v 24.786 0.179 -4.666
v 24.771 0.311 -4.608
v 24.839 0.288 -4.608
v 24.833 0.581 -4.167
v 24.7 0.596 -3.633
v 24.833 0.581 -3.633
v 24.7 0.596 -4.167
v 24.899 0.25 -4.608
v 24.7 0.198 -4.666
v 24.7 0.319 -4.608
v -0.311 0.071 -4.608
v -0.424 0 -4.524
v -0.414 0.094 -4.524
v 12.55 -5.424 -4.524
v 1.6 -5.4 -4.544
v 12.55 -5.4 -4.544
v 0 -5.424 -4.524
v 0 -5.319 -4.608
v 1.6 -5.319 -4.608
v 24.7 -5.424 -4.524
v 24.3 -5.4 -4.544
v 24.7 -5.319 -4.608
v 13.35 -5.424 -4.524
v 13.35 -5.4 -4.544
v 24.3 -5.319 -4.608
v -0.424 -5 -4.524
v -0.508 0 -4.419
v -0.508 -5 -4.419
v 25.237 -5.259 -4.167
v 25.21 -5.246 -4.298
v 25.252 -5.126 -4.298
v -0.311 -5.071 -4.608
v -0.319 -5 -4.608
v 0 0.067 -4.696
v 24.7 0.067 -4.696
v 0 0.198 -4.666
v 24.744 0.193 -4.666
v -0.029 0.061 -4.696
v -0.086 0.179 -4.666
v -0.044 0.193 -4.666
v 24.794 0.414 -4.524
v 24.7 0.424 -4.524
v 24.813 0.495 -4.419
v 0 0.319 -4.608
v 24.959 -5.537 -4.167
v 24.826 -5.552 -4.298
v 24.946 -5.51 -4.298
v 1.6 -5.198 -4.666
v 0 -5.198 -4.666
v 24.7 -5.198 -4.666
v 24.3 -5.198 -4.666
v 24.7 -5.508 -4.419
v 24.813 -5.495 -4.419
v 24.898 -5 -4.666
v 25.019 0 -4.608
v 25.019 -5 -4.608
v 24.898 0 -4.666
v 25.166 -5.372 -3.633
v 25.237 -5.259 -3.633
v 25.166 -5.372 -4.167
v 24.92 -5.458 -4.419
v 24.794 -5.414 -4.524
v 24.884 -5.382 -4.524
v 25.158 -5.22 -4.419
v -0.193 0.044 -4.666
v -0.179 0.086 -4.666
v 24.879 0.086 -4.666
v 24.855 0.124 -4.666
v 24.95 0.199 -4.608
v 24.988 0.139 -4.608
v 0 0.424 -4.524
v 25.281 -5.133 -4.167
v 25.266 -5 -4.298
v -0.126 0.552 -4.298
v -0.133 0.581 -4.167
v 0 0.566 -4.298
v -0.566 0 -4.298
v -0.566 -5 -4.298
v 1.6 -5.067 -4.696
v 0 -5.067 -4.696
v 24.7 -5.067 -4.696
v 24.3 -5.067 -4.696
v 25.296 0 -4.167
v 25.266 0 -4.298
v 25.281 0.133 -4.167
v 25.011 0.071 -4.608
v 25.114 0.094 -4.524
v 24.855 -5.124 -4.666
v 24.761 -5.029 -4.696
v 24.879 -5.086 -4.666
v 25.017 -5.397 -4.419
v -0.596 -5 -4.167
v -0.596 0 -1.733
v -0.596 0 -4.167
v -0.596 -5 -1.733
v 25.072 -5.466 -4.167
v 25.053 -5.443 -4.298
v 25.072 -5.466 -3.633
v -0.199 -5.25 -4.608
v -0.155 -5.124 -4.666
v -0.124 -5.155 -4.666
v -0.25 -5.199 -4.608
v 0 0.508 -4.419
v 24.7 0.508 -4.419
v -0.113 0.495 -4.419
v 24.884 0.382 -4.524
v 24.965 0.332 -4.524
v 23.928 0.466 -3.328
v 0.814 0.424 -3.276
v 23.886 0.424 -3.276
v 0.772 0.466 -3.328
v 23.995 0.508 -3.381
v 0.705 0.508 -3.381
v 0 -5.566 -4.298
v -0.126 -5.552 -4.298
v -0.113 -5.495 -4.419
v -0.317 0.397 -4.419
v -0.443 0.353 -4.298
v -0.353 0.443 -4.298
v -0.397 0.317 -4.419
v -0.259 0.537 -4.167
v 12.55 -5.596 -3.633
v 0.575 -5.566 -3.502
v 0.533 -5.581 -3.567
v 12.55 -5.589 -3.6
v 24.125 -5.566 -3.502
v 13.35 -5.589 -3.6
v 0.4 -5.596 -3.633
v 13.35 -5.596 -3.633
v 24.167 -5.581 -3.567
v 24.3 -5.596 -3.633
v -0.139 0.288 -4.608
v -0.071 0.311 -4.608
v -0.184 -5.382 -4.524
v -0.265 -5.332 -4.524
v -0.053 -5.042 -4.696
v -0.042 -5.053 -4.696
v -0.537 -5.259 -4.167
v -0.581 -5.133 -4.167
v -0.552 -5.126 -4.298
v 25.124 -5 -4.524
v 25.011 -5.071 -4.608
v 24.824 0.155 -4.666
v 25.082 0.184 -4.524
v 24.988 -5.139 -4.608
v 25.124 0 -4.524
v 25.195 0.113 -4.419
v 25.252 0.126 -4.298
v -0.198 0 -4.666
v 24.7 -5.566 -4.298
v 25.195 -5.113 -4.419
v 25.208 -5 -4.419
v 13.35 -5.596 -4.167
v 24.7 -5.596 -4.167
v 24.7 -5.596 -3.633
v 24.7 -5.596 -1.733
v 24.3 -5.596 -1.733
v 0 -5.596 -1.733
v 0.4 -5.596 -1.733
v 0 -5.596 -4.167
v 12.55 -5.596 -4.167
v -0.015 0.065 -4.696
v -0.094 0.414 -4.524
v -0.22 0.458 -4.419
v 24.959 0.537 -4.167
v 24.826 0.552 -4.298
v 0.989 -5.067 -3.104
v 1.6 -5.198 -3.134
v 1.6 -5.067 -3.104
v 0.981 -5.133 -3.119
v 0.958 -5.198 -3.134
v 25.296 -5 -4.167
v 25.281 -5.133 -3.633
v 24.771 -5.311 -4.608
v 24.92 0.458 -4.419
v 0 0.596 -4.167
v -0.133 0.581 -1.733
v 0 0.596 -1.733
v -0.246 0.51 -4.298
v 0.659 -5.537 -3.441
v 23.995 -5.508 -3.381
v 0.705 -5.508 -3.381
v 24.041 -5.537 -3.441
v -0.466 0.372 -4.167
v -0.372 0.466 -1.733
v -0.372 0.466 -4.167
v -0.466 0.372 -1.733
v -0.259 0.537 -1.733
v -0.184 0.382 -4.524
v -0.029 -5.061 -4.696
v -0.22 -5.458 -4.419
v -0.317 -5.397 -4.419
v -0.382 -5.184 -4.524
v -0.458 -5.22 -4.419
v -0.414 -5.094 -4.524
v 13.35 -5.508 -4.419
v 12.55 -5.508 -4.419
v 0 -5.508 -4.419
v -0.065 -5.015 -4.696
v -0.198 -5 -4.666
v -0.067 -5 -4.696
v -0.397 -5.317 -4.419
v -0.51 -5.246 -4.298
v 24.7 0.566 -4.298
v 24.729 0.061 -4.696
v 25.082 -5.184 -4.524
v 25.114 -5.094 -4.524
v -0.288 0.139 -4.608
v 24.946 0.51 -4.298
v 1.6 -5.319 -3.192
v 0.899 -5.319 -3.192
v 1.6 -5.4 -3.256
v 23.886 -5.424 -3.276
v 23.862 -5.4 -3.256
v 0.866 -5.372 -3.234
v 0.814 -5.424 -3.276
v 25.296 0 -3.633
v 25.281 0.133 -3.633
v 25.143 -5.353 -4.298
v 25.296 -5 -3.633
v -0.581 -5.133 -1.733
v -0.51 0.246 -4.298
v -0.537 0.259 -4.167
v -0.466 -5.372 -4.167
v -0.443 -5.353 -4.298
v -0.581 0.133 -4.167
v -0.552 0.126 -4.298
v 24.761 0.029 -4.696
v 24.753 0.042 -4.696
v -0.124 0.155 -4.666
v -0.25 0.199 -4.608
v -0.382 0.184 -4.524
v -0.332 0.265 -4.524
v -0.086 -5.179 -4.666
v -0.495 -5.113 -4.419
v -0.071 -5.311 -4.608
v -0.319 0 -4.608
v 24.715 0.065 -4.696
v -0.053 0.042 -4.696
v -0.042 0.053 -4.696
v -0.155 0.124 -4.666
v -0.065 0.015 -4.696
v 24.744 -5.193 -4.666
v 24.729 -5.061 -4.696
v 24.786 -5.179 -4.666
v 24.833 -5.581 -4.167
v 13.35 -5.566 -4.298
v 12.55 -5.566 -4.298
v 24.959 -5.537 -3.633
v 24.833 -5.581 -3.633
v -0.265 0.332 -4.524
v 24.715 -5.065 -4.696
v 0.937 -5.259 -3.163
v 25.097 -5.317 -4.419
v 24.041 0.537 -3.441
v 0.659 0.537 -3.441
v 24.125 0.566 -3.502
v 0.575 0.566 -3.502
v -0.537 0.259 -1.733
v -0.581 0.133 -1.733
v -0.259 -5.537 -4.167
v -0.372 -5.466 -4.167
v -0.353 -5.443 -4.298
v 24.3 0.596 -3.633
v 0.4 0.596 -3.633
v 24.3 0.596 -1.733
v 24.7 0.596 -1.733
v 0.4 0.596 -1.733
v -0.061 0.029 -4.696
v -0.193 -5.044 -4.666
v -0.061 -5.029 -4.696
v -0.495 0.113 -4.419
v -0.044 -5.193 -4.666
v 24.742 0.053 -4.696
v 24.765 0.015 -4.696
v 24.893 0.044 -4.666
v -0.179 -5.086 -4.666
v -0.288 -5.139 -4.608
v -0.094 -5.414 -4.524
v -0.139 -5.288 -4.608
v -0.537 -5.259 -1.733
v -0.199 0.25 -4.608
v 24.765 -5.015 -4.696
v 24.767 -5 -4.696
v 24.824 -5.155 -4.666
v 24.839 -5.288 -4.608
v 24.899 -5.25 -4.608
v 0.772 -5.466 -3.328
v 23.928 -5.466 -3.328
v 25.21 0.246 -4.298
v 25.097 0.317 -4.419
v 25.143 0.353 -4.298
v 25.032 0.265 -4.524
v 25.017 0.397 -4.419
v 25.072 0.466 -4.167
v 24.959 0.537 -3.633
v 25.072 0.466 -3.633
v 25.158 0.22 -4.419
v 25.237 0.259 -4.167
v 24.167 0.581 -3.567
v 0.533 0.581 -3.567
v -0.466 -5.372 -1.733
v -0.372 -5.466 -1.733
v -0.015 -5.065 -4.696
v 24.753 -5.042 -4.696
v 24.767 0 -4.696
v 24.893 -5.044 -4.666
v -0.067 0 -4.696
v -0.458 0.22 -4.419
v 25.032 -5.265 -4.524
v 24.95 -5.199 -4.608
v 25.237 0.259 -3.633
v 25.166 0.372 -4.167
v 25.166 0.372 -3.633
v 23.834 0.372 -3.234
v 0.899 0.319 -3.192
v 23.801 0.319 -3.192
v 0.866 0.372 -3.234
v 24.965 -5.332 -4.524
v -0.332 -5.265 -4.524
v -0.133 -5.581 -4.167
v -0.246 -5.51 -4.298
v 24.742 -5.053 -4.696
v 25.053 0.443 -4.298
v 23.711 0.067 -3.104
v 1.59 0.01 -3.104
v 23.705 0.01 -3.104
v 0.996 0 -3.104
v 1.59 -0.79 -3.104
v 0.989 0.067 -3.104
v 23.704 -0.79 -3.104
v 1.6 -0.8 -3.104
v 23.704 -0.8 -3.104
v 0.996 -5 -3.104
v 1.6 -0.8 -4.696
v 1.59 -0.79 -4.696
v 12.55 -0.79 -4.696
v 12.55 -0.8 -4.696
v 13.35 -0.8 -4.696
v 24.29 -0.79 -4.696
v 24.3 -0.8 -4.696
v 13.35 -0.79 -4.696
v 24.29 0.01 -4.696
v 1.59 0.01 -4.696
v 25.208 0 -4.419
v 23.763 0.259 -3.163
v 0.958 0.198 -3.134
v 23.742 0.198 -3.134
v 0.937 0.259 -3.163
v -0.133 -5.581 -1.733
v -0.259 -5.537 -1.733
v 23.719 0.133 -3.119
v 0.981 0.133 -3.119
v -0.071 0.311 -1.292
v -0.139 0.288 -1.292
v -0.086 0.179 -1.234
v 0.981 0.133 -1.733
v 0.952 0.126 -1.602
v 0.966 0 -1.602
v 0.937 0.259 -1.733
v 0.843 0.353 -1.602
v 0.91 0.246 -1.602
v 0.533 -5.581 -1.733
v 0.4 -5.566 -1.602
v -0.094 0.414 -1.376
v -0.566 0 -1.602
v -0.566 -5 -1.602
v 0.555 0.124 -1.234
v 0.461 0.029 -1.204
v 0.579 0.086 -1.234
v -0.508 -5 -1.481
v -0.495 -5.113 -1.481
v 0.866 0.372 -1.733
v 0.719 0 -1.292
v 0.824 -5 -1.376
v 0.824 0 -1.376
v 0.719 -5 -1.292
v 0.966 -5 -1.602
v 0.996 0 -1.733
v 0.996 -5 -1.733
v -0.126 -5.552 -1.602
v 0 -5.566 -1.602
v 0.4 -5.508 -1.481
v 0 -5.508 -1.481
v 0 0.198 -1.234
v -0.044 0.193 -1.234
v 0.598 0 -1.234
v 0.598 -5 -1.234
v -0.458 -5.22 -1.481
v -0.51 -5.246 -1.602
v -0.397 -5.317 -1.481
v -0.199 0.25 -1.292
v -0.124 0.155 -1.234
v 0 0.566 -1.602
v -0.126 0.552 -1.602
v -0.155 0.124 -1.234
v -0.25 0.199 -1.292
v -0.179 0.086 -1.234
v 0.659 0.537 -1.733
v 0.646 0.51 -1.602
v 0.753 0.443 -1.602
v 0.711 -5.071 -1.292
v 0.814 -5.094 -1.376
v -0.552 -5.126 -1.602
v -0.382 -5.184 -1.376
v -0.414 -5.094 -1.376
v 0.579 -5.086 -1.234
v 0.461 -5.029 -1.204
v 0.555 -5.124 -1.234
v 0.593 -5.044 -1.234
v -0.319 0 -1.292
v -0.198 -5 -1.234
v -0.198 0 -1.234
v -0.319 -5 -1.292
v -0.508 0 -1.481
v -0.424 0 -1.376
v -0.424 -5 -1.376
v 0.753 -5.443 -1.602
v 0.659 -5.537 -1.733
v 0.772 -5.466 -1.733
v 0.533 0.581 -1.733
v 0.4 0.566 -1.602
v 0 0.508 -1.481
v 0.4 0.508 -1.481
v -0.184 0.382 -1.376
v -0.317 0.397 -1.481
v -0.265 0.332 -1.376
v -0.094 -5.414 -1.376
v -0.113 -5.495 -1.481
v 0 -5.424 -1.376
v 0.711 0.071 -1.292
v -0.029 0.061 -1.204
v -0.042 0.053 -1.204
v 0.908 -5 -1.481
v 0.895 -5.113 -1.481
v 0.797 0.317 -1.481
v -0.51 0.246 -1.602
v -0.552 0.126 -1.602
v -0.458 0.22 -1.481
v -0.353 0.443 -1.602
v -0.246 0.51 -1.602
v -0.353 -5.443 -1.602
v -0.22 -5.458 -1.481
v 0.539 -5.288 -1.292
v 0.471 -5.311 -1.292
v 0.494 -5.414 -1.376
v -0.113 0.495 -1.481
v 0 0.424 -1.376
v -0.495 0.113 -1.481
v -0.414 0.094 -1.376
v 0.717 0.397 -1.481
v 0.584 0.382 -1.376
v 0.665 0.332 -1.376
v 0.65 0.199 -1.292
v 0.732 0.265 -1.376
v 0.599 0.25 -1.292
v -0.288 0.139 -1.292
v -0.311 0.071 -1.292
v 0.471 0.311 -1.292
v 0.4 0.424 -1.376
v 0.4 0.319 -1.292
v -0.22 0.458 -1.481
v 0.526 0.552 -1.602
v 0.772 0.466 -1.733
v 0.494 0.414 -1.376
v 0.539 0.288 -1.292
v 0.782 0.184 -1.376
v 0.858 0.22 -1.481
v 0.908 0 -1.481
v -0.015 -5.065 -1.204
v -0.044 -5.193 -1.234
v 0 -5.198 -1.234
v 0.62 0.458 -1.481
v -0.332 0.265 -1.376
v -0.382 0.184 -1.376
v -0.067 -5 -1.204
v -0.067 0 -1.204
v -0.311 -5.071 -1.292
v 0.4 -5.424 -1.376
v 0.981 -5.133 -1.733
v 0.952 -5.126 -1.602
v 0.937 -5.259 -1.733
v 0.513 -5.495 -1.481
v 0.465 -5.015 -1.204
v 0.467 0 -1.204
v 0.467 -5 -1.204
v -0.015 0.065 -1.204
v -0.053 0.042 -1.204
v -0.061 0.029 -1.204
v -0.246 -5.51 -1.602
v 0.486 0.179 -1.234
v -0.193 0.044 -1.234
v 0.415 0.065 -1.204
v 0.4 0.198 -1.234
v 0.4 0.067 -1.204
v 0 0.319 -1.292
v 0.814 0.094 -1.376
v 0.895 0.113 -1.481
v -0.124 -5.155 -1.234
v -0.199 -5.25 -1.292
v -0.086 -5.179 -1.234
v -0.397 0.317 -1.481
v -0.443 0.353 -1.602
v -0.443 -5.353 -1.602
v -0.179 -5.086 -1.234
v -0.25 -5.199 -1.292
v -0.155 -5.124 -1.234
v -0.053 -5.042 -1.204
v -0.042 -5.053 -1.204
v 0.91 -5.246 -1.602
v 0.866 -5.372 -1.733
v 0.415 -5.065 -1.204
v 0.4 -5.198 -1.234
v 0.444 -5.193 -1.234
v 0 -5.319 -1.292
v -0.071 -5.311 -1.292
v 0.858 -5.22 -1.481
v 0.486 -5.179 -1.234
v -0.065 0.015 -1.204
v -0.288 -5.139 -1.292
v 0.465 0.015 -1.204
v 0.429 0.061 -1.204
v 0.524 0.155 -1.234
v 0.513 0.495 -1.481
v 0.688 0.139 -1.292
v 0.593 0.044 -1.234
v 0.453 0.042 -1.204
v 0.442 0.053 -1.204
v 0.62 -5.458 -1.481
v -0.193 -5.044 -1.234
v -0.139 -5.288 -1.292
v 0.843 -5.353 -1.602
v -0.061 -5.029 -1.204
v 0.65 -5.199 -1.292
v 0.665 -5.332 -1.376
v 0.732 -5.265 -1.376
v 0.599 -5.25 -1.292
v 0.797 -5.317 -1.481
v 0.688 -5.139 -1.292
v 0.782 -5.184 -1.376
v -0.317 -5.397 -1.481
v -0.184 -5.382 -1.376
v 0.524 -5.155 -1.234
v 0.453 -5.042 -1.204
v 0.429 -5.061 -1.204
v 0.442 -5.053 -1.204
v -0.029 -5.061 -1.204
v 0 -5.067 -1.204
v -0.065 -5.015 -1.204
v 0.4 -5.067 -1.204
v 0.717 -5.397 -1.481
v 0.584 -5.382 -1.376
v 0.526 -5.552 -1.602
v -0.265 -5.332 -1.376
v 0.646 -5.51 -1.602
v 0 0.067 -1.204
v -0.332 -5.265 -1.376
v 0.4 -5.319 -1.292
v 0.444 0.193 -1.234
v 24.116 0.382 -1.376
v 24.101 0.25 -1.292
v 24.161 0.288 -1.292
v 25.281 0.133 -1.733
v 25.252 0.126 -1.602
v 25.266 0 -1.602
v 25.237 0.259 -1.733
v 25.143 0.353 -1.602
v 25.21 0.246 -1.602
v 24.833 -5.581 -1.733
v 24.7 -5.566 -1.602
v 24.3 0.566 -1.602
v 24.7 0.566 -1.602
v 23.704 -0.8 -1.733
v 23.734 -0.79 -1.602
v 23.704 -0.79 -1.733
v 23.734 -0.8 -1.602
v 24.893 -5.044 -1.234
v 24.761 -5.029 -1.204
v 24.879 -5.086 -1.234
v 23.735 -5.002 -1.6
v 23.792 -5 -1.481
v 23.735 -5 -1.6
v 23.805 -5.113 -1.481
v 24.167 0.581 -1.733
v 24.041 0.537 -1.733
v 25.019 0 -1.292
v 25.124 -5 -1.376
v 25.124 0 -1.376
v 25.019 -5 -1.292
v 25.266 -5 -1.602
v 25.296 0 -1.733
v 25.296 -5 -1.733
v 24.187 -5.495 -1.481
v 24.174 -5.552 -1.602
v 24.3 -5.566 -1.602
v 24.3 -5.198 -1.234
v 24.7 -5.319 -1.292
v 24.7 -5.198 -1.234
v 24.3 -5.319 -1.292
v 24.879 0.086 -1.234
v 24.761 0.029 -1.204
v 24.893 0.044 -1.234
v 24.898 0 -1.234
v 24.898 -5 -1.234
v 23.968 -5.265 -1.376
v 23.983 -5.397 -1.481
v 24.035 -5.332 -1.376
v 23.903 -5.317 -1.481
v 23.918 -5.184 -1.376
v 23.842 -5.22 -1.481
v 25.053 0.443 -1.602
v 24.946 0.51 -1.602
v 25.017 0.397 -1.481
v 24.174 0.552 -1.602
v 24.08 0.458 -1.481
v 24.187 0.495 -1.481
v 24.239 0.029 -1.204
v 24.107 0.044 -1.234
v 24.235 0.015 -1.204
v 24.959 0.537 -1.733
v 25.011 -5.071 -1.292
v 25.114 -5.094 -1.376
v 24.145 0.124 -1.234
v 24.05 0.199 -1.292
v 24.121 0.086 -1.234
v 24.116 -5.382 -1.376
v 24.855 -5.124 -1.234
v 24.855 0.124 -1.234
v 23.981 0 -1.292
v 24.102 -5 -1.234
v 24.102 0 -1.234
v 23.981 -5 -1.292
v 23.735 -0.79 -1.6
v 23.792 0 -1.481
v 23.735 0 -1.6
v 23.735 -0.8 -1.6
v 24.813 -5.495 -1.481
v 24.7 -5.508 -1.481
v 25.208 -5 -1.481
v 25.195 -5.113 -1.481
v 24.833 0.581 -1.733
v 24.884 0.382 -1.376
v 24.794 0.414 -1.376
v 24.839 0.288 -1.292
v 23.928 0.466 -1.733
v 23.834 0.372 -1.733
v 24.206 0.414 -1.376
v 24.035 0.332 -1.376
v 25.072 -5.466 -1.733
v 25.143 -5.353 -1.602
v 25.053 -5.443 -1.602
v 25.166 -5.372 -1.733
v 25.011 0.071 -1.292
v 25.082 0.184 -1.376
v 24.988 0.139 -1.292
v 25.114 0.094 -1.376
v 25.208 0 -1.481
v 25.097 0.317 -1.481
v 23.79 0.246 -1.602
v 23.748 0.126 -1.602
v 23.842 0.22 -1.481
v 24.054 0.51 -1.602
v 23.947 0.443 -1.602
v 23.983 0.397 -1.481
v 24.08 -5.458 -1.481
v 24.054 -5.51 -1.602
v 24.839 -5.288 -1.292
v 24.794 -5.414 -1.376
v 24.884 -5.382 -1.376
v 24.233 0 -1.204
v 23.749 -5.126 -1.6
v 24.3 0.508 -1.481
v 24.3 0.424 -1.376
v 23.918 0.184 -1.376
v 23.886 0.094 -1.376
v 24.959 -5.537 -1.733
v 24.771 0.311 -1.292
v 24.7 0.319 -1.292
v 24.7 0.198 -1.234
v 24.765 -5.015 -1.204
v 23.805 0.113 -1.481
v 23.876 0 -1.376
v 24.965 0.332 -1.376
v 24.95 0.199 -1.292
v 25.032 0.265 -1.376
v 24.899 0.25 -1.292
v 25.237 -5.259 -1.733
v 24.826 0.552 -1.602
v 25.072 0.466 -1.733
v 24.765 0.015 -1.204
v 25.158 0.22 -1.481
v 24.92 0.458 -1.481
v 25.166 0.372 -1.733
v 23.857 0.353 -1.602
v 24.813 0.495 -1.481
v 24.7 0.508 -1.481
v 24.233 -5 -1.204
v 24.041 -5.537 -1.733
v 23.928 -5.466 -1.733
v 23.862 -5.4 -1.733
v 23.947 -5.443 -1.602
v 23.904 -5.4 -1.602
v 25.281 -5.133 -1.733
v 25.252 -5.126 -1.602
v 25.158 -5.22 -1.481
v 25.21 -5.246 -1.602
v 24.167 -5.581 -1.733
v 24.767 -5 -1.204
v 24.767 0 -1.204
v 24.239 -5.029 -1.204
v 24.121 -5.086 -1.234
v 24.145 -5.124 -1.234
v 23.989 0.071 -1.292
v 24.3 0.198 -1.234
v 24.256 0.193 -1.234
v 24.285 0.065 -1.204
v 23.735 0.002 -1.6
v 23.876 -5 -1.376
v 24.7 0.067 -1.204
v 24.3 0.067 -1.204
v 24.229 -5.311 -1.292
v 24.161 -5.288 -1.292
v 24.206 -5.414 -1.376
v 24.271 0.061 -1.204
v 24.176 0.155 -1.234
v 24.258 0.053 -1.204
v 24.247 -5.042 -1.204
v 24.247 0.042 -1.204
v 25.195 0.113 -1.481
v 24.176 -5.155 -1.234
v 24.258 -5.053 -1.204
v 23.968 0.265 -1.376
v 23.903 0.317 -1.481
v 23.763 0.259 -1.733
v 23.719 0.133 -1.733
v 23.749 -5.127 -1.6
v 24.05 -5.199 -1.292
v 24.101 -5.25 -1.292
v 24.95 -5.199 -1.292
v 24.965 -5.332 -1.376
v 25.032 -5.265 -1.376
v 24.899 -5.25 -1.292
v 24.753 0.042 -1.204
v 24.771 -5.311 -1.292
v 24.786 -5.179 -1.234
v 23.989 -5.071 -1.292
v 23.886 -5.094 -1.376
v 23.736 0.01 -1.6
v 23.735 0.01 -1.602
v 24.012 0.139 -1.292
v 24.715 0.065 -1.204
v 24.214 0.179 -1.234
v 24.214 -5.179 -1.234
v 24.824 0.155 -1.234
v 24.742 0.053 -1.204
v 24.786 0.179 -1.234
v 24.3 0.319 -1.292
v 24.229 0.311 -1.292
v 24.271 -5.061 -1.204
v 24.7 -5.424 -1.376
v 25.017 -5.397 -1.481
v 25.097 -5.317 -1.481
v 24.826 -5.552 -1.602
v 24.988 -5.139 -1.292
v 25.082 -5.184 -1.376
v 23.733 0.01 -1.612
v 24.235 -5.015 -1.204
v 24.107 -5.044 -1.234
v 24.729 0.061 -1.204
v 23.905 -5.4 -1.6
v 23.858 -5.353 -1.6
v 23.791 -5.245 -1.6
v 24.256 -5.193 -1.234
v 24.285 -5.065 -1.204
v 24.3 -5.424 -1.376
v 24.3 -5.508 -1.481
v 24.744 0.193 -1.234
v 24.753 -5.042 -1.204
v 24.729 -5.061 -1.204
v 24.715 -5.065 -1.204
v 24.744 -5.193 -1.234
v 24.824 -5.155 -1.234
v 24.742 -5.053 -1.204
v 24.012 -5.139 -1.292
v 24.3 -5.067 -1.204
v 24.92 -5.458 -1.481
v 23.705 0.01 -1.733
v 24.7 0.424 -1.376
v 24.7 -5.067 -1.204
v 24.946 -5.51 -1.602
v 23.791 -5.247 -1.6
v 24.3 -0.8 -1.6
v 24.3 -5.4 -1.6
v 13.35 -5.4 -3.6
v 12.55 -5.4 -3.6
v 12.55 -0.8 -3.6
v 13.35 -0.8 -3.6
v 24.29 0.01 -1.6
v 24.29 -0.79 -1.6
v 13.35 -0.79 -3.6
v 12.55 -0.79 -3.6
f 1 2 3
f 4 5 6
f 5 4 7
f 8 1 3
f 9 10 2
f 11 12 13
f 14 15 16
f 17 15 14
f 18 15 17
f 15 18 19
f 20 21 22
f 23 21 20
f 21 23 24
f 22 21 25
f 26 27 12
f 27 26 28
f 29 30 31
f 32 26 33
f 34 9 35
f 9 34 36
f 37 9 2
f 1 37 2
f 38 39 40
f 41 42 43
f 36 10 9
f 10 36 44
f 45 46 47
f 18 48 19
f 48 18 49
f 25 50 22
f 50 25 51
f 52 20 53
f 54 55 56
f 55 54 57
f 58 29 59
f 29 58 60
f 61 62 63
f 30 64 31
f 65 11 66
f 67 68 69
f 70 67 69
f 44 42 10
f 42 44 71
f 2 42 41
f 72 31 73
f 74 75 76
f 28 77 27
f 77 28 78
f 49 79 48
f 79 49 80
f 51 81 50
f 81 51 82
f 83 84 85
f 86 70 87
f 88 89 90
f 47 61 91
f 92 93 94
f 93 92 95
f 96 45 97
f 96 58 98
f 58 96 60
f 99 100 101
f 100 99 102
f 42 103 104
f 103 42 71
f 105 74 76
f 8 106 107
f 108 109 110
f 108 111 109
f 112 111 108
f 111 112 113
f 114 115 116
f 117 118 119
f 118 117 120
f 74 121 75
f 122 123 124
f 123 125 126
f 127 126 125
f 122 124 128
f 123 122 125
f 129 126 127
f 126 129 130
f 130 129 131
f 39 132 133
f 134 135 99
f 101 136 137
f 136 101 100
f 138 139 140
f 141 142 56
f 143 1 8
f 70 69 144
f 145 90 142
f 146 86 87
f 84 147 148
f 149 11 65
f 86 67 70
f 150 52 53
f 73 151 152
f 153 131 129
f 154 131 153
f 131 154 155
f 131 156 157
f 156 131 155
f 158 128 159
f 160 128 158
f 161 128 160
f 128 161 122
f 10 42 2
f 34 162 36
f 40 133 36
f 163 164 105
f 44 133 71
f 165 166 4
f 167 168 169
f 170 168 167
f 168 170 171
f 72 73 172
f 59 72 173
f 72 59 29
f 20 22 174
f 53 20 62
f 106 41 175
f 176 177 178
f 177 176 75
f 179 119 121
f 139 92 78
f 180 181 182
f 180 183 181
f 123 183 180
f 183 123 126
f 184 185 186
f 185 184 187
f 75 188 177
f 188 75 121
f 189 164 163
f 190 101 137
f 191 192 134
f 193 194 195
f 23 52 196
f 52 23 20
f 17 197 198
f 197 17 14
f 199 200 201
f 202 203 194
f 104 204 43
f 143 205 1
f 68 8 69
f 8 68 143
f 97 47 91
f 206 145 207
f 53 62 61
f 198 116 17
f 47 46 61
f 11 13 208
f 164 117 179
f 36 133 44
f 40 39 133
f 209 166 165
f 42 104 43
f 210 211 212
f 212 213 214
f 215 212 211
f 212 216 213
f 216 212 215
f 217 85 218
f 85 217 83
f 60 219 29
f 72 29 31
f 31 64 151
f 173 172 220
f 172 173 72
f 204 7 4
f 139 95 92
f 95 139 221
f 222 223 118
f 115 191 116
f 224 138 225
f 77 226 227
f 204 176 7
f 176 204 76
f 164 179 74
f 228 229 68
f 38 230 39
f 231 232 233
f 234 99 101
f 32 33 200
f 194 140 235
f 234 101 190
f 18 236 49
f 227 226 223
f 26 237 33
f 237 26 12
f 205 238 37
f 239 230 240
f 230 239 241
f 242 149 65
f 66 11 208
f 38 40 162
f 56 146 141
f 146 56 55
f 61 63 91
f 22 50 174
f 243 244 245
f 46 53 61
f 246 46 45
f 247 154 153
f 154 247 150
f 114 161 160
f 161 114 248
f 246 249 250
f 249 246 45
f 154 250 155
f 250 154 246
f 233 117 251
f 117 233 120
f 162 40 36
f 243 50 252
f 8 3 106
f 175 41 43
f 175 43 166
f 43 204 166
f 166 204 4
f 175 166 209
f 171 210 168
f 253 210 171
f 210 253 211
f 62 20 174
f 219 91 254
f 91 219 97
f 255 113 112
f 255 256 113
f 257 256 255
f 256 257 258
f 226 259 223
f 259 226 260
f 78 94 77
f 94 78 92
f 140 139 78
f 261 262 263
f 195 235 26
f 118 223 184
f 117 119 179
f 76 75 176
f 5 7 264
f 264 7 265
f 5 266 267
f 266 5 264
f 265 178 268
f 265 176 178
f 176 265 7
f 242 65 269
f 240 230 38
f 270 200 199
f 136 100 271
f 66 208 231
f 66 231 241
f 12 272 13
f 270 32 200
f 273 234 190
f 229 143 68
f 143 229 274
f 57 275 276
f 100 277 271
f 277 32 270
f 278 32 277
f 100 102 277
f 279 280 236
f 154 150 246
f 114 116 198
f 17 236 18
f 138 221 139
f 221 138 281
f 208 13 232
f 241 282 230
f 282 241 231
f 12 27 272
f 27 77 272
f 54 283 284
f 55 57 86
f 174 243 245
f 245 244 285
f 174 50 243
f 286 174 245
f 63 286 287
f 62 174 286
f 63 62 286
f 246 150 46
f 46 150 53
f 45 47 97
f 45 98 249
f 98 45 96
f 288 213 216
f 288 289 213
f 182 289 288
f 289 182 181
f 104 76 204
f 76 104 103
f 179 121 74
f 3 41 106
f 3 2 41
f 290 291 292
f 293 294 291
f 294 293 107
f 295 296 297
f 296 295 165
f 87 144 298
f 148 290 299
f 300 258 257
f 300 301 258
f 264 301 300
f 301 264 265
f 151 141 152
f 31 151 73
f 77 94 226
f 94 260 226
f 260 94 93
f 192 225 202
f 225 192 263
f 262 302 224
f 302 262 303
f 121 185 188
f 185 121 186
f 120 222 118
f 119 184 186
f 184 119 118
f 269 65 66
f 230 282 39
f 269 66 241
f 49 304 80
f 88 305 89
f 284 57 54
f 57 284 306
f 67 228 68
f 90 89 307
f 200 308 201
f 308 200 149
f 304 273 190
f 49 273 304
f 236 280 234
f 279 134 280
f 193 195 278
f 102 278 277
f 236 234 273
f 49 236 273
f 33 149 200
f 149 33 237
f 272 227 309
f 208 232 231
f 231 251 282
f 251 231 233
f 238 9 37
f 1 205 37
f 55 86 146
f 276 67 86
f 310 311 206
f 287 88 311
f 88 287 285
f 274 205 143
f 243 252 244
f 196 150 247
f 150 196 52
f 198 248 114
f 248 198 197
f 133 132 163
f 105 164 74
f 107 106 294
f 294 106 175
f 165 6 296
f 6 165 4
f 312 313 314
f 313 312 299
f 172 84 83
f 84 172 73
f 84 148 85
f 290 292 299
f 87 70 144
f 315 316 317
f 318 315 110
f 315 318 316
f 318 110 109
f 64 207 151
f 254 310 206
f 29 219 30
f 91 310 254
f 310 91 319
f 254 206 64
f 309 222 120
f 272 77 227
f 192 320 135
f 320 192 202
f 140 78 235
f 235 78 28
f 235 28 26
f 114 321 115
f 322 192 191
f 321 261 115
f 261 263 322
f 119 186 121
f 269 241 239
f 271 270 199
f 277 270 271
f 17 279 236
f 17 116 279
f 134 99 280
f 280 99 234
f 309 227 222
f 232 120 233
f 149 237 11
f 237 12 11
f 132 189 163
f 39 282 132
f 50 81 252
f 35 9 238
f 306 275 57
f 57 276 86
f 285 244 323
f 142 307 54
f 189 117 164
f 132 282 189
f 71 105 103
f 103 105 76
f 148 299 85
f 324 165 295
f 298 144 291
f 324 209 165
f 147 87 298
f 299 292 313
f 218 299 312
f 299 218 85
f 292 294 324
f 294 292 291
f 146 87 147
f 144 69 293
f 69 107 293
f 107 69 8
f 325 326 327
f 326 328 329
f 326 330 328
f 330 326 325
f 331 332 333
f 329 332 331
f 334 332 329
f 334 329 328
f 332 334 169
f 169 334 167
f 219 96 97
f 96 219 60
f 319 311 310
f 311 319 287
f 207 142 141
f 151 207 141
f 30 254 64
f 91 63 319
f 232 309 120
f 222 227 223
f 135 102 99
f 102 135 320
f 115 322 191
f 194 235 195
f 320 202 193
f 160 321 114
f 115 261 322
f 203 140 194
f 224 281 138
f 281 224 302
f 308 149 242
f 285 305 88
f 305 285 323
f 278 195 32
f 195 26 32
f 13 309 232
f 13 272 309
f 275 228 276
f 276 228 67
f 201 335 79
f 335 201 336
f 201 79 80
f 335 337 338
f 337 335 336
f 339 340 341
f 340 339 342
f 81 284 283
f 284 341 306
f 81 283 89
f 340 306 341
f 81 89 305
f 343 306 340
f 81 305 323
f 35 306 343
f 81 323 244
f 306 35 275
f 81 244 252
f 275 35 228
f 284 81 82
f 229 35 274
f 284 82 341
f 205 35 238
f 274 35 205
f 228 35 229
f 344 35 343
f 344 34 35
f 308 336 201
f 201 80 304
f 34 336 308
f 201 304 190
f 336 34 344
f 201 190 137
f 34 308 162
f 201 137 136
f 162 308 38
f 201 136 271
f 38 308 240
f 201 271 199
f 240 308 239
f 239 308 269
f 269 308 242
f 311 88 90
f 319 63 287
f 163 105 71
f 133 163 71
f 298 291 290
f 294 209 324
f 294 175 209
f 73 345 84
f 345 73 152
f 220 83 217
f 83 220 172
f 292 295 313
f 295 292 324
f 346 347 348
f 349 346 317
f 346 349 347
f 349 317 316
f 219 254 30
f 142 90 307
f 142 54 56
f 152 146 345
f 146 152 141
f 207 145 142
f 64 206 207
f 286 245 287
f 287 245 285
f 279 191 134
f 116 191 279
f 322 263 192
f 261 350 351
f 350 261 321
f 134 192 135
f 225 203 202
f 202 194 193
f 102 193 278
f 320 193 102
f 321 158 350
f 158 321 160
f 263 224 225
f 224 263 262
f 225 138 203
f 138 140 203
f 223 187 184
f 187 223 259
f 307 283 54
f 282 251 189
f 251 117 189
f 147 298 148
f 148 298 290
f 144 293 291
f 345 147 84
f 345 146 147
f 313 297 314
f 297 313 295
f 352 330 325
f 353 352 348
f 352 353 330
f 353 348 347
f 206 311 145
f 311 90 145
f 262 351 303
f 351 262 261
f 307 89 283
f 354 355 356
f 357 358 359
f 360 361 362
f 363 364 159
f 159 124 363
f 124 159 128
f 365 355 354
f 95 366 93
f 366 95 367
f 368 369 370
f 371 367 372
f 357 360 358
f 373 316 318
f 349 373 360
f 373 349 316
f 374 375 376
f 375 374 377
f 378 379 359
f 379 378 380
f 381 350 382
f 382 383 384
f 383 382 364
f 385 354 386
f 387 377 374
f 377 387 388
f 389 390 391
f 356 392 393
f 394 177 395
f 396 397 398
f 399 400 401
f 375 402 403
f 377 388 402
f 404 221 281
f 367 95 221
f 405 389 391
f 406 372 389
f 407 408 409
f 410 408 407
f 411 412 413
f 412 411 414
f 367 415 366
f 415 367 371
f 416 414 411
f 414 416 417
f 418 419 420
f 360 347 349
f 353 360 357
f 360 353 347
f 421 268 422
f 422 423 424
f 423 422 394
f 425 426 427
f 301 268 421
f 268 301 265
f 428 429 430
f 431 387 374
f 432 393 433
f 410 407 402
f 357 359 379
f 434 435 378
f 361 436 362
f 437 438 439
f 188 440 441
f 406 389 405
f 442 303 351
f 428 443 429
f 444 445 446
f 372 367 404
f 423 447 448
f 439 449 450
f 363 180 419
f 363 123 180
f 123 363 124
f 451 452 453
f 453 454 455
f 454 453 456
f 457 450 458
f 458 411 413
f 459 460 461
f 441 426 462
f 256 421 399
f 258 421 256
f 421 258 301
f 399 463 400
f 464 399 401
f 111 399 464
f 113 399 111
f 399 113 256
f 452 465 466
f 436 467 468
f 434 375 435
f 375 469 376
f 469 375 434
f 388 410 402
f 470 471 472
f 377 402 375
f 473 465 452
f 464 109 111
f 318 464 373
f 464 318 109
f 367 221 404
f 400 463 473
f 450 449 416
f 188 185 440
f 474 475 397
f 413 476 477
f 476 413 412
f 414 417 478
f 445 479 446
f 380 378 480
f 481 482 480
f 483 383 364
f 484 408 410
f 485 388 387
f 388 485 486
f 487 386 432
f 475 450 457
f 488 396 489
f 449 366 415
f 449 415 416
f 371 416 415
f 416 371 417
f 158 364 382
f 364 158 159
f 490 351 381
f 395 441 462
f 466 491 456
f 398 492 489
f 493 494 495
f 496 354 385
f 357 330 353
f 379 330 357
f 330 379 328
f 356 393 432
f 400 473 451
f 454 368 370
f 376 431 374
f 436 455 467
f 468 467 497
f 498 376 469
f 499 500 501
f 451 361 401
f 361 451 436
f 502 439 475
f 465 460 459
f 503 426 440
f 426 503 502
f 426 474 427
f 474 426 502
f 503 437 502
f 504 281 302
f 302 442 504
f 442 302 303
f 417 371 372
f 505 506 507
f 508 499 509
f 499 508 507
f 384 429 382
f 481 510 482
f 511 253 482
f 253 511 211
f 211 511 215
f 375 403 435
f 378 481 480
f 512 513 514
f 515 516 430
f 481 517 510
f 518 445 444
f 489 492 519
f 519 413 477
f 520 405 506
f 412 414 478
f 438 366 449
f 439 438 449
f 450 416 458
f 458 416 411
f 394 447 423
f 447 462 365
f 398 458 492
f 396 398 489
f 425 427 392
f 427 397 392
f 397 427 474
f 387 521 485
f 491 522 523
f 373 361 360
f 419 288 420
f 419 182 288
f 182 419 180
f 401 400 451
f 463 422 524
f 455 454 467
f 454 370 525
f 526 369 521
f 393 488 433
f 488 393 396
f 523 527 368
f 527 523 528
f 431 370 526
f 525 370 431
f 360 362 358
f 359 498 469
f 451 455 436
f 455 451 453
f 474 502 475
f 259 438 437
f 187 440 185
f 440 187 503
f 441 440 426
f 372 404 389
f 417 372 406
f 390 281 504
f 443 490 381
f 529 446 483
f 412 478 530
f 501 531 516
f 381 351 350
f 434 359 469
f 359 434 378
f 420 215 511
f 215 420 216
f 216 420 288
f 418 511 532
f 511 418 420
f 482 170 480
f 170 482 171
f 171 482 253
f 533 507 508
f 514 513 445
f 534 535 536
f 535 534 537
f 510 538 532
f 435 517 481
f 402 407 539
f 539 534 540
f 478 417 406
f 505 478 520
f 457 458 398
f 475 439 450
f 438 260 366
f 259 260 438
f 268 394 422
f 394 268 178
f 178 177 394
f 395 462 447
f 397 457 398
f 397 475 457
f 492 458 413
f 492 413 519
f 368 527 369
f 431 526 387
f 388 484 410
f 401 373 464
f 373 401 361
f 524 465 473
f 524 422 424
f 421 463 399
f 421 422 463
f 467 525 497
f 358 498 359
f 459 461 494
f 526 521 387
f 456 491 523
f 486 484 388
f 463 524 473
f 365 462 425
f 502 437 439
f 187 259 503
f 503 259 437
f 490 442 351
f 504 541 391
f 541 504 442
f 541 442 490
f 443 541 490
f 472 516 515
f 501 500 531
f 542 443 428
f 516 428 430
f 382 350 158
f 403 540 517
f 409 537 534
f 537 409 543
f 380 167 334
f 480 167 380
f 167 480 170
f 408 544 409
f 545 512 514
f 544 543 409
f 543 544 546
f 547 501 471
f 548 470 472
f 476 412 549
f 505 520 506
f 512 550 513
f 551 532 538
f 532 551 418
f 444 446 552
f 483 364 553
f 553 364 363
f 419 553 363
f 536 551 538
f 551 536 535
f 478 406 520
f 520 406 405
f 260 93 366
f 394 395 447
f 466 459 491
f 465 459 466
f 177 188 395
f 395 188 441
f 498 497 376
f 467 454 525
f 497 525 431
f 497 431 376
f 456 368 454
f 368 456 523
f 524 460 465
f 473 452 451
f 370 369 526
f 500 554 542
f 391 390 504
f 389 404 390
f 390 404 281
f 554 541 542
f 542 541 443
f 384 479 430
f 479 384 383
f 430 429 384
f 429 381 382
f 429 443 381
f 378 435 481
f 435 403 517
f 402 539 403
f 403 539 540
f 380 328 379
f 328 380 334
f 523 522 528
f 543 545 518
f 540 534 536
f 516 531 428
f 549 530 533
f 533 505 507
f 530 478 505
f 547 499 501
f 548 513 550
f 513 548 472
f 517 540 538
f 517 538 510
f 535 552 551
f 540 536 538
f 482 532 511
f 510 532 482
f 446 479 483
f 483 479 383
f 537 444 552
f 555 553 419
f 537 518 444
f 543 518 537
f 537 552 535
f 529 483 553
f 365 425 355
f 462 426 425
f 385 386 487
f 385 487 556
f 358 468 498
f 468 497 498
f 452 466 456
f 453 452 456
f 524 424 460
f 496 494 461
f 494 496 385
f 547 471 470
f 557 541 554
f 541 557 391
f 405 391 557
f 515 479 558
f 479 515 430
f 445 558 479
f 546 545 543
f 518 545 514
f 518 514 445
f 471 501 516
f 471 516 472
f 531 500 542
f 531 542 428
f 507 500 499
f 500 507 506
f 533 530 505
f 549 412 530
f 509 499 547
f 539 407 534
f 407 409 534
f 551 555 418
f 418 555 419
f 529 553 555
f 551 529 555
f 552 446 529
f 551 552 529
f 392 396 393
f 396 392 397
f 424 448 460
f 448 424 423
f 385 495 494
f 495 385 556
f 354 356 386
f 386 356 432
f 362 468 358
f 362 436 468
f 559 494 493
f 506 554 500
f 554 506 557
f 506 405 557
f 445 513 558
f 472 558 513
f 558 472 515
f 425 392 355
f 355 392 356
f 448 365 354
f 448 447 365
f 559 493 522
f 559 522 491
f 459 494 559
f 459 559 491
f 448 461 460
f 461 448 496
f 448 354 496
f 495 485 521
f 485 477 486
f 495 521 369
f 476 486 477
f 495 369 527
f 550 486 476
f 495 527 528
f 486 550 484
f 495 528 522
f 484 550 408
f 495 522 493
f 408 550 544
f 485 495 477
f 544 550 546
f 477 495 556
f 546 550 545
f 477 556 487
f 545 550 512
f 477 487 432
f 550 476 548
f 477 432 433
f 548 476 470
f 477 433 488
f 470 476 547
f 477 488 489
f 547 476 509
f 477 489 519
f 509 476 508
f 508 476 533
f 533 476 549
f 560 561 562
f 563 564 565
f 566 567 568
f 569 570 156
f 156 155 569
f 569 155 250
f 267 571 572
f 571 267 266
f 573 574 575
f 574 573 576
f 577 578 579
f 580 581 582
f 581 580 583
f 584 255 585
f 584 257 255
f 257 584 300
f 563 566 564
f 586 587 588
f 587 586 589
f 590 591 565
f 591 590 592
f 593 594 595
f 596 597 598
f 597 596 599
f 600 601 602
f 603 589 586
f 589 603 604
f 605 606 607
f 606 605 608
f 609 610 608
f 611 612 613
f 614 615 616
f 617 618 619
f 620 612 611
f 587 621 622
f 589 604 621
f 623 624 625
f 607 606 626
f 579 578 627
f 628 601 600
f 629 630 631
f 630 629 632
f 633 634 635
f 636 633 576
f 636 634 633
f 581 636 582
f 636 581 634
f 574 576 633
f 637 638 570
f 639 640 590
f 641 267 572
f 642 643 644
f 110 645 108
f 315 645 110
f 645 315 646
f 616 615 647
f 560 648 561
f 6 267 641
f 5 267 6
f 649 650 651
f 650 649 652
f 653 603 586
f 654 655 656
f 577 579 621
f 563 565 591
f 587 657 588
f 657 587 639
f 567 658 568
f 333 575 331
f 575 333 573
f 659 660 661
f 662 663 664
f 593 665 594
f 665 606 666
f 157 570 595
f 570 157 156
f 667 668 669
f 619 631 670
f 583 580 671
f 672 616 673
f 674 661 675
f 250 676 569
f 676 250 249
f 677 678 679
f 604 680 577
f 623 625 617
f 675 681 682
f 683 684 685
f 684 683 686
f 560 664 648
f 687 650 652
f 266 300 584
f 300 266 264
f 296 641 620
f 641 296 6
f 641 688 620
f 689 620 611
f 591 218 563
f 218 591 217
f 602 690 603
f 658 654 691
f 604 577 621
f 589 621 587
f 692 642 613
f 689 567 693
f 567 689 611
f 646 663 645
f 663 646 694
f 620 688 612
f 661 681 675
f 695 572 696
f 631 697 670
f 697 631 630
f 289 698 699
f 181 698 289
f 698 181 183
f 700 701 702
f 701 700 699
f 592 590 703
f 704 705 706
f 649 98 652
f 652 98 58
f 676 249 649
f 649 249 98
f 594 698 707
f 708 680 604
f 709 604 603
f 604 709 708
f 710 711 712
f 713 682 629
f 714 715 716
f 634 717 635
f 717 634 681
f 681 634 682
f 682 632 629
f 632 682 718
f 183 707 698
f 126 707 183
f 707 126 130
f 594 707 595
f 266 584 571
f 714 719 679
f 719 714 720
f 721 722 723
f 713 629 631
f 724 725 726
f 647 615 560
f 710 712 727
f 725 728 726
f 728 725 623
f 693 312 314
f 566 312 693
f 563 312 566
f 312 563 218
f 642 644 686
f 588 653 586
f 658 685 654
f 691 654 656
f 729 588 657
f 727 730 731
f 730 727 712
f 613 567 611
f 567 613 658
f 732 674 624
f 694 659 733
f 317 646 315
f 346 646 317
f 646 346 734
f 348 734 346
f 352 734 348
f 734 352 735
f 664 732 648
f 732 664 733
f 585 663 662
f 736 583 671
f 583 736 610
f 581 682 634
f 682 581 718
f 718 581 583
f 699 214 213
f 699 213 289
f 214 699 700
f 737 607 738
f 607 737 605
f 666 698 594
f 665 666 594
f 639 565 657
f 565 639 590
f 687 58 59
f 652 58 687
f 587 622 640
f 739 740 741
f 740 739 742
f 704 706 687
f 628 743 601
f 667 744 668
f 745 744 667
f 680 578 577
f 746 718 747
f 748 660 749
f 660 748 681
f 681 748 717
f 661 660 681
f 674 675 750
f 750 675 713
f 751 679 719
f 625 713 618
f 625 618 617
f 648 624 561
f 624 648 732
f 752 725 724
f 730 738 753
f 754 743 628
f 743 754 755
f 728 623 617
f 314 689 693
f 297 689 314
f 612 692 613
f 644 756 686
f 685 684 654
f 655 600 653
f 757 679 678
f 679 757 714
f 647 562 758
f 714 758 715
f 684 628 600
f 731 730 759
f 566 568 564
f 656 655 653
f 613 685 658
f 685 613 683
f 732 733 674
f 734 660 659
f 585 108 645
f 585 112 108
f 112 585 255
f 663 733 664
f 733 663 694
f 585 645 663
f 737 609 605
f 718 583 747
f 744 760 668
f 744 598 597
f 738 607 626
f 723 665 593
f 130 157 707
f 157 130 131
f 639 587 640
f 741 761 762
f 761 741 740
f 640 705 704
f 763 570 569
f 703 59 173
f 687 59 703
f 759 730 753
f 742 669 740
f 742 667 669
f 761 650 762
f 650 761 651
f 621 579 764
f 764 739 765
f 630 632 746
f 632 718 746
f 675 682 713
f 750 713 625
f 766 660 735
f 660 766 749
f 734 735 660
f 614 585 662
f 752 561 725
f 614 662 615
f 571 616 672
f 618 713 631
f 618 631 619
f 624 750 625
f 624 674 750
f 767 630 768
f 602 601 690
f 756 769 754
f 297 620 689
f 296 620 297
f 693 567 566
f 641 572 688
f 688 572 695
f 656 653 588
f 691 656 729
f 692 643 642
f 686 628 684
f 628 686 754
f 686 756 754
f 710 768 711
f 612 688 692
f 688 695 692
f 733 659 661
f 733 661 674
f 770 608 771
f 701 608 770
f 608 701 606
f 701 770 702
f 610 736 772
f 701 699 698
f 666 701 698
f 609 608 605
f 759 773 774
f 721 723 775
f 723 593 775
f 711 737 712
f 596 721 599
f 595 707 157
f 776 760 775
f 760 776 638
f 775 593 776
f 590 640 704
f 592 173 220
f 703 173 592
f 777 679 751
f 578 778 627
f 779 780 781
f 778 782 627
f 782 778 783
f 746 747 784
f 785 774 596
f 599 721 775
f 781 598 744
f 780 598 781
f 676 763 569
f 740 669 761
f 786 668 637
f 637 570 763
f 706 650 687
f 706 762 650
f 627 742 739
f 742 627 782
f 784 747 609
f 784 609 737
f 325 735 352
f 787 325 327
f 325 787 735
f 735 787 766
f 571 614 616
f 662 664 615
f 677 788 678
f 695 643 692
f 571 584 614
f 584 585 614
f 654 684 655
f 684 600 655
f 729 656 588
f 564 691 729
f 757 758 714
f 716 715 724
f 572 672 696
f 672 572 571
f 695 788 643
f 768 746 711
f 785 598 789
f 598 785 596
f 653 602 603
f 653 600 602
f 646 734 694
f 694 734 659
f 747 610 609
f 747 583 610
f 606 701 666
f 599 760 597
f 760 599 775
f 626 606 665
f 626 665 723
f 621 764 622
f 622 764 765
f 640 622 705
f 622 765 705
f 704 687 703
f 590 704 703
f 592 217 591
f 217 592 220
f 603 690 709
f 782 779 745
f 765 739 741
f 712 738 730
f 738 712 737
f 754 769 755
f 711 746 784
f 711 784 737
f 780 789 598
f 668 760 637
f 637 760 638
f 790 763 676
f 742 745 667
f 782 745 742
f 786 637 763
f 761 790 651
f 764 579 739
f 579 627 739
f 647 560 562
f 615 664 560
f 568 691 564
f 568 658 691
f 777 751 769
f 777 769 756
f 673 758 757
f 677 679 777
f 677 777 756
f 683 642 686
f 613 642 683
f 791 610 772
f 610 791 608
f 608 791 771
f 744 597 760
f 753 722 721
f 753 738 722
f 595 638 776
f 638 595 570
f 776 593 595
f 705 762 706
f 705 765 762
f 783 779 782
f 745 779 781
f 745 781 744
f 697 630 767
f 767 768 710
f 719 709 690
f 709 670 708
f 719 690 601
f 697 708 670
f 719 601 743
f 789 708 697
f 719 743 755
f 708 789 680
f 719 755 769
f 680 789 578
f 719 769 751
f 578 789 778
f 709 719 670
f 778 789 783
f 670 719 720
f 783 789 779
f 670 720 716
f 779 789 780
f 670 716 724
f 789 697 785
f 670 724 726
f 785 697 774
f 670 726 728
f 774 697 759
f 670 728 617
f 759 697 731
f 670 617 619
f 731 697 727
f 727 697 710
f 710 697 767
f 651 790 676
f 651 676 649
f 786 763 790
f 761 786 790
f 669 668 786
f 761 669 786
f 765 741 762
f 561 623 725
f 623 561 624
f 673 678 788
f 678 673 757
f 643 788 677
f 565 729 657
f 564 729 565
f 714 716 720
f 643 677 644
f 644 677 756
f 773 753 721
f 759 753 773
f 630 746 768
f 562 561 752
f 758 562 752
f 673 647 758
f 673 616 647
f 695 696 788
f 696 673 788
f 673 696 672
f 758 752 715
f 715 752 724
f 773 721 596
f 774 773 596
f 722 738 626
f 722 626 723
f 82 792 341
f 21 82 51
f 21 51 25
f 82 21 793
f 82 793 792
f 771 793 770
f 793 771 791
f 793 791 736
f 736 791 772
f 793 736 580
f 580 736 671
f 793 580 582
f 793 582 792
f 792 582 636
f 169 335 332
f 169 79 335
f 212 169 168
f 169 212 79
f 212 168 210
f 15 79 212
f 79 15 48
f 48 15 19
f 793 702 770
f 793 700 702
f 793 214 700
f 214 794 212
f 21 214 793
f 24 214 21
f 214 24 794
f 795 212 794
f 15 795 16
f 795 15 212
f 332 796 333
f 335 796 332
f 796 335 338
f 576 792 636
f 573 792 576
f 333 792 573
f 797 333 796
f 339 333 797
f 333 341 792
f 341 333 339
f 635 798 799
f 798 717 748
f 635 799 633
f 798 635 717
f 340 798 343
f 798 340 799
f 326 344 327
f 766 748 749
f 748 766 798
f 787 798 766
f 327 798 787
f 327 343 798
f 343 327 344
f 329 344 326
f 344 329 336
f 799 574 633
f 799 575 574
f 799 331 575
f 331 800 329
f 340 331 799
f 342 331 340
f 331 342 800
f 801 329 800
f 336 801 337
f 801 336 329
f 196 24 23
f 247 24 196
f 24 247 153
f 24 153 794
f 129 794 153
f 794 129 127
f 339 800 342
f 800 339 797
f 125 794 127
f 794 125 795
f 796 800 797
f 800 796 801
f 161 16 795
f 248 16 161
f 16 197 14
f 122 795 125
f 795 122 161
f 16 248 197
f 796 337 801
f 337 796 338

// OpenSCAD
// Creality K1 / K1 Max FFC/ZIF Ribbon Clip (v2 - easier to fit)
// ------------------------------------------------------------
// Key change vs v1: you set the *INNER* cavity dimensions (what must fit),
// and then tune clearance/pressure with a couple of simple parameters.
//
// PRINT
// - Print with the open side DOWN (default orientation in file).
// - PLA or PETG. PETG is more forgiving.
//
// INSTALL
// - Power off printer.
// - Seat ribbon, close ZIF latch.
// - Slide clip over connector + ribbon. If too tight, increase `side_clearance`.
//
// --------------------
// MEASURE THESE 3
// --------------------
inner_width  = 22.0;  // mm  : connector body width (left-to-right)
inner_depth  = 4.2;   // mm  : connector body depth (front-to-back)
inner_height = 3.2;   // mm  : connector body height (PCB to top of connector, without cable)

// --------------------
// TUNE FIT / PRESSURE
// --------------------
side_clearance = 0.35;  // mm per side. Increase if arms won't slide on (try 0.45, 0.55)
front_clearance = 0.20; // mm (depth clearance). Increase if it binds front/back
top_clearance   = 0.15; // mm (height clearance). Increase if it binds vertically
top_press       = 0.35; // mm extra downward press on cable (0.2–0.5 typical)

// --------------------
// CLIP GEOMETRY
// --------------------
wall_thickness  = 1.6;  // mm outer plastic thickness
arm_drop        = 3.5;  // mm how far arms extend down sides
lead_in         = 0.8;  // mm chamfer lead-in to help sliding on
split_gap       = 0.8;  // mm slot in top bar to add flex (helps tight connectors)
fillet_r        = 0.6;  // mm rounded edges

$fn = 28;

// helper: rounded rectangle prism
module rounded_prism(x,y,z,r){
  minkowski(){
    cube([x-2*r, y-2*r, z-2*r], center=false);
    sphere(r=r);
  }
}

module clip_v2(){
  // cavity (what must fit)
  cav_w = inner_width  + 2*side_clearance;
  cav_d = inner_depth  + 2*front_clearance;
  cav_h = inner_height + top_clearance;

  // outer
  out_w = cav_w + 2*wall_thickness;
  out_d = cav_d + wall_thickness;              // extra at back for strength
  out_h = cav_h + wall_thickness + top_press;  // add press on top

  difference(){
    // OUTER "U" BODY
    union(){
      // top bar
      translate([0,0,out_h-wall_thickness])
        rounded_prism(out_w, out_d, wall_thickness, fillet_r);

      // left arm
      translate([0,0,out_h-arm_drop])
        rounded_prism(wall_thickness, out_d, arm_drop, fillet_r);

      // right arm
      translate([out_w-wall_thickness,0,out_h-arm_drop])
        rounded_prism(wall_thickness, out_d, arm_drop, fillet_r);
    }

    // CAVITY (connector space)
    translate([wall_thickness, wall_thickness/2, out_h-(cav_h+top_press)])
      cube([cav_w, cav_d, cav_h+top_press]);

    // LEAD-IN CHAMFER (makes it easier to start sliding on)
    translate([wall_thickness-0.01, -0.01, out_h-(cav_h+top_press)])
      linear_extrude(height=cav_h+top_press)
        polygon(points=[
          [0,0],
          [cav_w,0],
          [cav_w,lead_in],
          [0,lead_in]
        ]);

    // FLEX SLOT in top bar (optional)
    if (split_gap > 0){
      translate([out_w/2 - split_gap/2, 0, out_h-wall_thickness-0.1])
        cube([split_gap, out_d, wall_thickness+0.2]);
    }
  }
}

// orient for printing: open side down
rotate([180,0,0]) clip_v2();
